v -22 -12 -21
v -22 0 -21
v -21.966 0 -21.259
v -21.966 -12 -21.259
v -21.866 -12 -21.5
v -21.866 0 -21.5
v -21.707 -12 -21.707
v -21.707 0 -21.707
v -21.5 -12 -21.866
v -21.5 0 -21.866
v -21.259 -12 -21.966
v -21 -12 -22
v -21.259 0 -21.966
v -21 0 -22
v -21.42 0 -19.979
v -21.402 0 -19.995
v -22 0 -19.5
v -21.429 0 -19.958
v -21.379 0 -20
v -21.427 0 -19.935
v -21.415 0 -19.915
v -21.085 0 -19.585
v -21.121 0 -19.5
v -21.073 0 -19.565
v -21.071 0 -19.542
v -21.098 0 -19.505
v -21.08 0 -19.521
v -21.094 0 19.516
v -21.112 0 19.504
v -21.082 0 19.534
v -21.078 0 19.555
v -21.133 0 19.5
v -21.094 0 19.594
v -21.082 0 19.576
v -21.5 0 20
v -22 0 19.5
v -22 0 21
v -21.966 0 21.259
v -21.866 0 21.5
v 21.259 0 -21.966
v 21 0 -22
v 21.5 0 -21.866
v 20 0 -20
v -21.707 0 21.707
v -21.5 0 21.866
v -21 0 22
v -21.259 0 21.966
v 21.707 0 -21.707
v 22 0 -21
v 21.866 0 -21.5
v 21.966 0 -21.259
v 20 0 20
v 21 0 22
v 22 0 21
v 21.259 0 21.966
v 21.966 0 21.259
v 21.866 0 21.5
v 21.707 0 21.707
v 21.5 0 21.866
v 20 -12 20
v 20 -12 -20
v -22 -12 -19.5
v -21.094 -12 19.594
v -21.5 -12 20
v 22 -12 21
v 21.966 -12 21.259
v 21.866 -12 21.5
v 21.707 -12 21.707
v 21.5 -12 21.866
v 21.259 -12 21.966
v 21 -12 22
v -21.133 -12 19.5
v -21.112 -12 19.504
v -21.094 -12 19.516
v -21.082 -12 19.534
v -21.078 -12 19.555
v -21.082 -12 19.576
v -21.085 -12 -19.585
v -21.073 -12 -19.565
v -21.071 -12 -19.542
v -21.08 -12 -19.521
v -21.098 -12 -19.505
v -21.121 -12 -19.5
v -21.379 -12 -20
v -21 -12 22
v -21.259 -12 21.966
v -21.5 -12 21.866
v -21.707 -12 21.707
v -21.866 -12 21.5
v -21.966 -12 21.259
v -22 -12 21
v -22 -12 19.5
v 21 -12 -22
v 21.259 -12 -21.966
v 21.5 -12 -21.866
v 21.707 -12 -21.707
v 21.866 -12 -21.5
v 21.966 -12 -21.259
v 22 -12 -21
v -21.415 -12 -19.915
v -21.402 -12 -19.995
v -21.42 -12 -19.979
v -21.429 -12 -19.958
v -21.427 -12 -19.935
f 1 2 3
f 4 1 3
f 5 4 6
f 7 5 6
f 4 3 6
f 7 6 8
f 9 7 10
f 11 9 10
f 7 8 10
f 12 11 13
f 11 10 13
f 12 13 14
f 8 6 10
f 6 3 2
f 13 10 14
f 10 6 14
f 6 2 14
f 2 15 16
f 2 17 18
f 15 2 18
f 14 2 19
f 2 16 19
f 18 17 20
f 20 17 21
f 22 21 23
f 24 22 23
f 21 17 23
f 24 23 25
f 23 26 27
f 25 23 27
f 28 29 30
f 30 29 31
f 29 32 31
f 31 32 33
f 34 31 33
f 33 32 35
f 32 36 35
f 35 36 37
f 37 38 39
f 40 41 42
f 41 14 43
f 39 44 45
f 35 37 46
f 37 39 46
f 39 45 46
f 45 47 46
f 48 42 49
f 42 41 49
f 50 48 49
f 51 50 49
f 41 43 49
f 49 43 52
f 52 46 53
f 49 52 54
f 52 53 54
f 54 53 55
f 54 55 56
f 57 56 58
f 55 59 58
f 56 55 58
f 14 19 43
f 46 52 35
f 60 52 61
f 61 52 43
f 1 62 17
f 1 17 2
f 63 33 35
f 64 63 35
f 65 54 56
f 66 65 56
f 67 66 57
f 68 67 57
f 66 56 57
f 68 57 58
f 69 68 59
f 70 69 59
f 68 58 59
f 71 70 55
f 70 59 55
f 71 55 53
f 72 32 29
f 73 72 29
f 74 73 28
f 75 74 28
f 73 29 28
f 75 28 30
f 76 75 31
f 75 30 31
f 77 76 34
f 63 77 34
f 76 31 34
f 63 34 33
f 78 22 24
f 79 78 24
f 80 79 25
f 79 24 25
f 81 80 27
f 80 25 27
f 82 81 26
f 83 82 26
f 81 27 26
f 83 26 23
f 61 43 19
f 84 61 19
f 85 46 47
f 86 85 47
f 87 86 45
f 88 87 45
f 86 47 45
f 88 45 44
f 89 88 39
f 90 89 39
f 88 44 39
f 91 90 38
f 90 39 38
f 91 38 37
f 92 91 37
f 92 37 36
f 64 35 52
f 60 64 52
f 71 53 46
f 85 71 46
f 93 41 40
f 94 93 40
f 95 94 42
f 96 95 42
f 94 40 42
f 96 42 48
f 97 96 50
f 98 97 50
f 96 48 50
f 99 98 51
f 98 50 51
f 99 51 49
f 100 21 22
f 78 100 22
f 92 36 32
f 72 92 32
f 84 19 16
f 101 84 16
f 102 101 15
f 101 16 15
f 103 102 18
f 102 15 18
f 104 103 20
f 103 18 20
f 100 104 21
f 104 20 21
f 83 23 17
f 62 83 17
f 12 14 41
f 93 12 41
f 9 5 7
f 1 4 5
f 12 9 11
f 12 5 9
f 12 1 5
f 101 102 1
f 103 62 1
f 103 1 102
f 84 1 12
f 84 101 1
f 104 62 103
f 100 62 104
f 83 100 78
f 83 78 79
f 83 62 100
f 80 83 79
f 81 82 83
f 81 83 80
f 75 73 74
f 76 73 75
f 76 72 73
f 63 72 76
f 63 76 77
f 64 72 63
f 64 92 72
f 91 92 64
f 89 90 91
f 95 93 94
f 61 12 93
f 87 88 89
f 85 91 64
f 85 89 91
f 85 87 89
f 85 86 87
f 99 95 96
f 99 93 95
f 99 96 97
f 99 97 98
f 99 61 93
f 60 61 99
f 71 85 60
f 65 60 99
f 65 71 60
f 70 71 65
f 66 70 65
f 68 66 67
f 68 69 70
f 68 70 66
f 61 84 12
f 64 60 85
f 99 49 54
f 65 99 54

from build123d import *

# Parameters (mm, degrees)
F1_DEPTH = 12


with BuildPart() as f1:
    # F0 (on Front) → F1 (new body)
    with BuildSketch(Plane.XZ):
        with BuildLine():
            Line((-20, 20), (20, 20))
            Line((20, 20), (20, -20))
            Line((20, -20), (-20, -20))
            Line((-20, -20), (-21.379289, -20))
            ThreePointArc((-21.379289, -20), (-21.425483, -19.969134), (-21.414645, -19.914645))
            Line((-21.414645, -19.914645), (-21.085355, -19.585355))
            ThreePointArc((-21.085355, -19.585355), (-21.074517, -19.530866), (-21.120711, -19.5))
            Line((-21.120711, -19.5), (-22, -19.5))
            Line((-22, -19.5), (-22, -21))
            ThreePointArc((-22, -21), (-21.707107, -21.707107), (-21, -22))
            Line((-21, -22), (21, -22))
            ThreePointArc((21, -22), (21.707107, -21.707107), (22, -21))
            Line((22, -21), (22, 21))
            ThreePointArc((22, 21), (21.707107, 21.707107), (21, 22))
            Line((21, 22), (-21, 22))
            ThreePointArc((-21, 22), (-21.707107, 21.707107), (-22, 21))
            Line((-22, 21), (-22, 19.5))
            Line((-22, 19.5), (-21.133234, 19.5))
            ThreePointArc((-21.133234, 19.5), (-21.082247, 19.534068), (-21.094211, 19.594211))
            Line((-21.094211, 19.594211), (-21.5, 20))
            Line((-21.5, 20), (-20, 20))
        make_face()
    extrude(amount=F1_DEPTH)


solid = f1.part
